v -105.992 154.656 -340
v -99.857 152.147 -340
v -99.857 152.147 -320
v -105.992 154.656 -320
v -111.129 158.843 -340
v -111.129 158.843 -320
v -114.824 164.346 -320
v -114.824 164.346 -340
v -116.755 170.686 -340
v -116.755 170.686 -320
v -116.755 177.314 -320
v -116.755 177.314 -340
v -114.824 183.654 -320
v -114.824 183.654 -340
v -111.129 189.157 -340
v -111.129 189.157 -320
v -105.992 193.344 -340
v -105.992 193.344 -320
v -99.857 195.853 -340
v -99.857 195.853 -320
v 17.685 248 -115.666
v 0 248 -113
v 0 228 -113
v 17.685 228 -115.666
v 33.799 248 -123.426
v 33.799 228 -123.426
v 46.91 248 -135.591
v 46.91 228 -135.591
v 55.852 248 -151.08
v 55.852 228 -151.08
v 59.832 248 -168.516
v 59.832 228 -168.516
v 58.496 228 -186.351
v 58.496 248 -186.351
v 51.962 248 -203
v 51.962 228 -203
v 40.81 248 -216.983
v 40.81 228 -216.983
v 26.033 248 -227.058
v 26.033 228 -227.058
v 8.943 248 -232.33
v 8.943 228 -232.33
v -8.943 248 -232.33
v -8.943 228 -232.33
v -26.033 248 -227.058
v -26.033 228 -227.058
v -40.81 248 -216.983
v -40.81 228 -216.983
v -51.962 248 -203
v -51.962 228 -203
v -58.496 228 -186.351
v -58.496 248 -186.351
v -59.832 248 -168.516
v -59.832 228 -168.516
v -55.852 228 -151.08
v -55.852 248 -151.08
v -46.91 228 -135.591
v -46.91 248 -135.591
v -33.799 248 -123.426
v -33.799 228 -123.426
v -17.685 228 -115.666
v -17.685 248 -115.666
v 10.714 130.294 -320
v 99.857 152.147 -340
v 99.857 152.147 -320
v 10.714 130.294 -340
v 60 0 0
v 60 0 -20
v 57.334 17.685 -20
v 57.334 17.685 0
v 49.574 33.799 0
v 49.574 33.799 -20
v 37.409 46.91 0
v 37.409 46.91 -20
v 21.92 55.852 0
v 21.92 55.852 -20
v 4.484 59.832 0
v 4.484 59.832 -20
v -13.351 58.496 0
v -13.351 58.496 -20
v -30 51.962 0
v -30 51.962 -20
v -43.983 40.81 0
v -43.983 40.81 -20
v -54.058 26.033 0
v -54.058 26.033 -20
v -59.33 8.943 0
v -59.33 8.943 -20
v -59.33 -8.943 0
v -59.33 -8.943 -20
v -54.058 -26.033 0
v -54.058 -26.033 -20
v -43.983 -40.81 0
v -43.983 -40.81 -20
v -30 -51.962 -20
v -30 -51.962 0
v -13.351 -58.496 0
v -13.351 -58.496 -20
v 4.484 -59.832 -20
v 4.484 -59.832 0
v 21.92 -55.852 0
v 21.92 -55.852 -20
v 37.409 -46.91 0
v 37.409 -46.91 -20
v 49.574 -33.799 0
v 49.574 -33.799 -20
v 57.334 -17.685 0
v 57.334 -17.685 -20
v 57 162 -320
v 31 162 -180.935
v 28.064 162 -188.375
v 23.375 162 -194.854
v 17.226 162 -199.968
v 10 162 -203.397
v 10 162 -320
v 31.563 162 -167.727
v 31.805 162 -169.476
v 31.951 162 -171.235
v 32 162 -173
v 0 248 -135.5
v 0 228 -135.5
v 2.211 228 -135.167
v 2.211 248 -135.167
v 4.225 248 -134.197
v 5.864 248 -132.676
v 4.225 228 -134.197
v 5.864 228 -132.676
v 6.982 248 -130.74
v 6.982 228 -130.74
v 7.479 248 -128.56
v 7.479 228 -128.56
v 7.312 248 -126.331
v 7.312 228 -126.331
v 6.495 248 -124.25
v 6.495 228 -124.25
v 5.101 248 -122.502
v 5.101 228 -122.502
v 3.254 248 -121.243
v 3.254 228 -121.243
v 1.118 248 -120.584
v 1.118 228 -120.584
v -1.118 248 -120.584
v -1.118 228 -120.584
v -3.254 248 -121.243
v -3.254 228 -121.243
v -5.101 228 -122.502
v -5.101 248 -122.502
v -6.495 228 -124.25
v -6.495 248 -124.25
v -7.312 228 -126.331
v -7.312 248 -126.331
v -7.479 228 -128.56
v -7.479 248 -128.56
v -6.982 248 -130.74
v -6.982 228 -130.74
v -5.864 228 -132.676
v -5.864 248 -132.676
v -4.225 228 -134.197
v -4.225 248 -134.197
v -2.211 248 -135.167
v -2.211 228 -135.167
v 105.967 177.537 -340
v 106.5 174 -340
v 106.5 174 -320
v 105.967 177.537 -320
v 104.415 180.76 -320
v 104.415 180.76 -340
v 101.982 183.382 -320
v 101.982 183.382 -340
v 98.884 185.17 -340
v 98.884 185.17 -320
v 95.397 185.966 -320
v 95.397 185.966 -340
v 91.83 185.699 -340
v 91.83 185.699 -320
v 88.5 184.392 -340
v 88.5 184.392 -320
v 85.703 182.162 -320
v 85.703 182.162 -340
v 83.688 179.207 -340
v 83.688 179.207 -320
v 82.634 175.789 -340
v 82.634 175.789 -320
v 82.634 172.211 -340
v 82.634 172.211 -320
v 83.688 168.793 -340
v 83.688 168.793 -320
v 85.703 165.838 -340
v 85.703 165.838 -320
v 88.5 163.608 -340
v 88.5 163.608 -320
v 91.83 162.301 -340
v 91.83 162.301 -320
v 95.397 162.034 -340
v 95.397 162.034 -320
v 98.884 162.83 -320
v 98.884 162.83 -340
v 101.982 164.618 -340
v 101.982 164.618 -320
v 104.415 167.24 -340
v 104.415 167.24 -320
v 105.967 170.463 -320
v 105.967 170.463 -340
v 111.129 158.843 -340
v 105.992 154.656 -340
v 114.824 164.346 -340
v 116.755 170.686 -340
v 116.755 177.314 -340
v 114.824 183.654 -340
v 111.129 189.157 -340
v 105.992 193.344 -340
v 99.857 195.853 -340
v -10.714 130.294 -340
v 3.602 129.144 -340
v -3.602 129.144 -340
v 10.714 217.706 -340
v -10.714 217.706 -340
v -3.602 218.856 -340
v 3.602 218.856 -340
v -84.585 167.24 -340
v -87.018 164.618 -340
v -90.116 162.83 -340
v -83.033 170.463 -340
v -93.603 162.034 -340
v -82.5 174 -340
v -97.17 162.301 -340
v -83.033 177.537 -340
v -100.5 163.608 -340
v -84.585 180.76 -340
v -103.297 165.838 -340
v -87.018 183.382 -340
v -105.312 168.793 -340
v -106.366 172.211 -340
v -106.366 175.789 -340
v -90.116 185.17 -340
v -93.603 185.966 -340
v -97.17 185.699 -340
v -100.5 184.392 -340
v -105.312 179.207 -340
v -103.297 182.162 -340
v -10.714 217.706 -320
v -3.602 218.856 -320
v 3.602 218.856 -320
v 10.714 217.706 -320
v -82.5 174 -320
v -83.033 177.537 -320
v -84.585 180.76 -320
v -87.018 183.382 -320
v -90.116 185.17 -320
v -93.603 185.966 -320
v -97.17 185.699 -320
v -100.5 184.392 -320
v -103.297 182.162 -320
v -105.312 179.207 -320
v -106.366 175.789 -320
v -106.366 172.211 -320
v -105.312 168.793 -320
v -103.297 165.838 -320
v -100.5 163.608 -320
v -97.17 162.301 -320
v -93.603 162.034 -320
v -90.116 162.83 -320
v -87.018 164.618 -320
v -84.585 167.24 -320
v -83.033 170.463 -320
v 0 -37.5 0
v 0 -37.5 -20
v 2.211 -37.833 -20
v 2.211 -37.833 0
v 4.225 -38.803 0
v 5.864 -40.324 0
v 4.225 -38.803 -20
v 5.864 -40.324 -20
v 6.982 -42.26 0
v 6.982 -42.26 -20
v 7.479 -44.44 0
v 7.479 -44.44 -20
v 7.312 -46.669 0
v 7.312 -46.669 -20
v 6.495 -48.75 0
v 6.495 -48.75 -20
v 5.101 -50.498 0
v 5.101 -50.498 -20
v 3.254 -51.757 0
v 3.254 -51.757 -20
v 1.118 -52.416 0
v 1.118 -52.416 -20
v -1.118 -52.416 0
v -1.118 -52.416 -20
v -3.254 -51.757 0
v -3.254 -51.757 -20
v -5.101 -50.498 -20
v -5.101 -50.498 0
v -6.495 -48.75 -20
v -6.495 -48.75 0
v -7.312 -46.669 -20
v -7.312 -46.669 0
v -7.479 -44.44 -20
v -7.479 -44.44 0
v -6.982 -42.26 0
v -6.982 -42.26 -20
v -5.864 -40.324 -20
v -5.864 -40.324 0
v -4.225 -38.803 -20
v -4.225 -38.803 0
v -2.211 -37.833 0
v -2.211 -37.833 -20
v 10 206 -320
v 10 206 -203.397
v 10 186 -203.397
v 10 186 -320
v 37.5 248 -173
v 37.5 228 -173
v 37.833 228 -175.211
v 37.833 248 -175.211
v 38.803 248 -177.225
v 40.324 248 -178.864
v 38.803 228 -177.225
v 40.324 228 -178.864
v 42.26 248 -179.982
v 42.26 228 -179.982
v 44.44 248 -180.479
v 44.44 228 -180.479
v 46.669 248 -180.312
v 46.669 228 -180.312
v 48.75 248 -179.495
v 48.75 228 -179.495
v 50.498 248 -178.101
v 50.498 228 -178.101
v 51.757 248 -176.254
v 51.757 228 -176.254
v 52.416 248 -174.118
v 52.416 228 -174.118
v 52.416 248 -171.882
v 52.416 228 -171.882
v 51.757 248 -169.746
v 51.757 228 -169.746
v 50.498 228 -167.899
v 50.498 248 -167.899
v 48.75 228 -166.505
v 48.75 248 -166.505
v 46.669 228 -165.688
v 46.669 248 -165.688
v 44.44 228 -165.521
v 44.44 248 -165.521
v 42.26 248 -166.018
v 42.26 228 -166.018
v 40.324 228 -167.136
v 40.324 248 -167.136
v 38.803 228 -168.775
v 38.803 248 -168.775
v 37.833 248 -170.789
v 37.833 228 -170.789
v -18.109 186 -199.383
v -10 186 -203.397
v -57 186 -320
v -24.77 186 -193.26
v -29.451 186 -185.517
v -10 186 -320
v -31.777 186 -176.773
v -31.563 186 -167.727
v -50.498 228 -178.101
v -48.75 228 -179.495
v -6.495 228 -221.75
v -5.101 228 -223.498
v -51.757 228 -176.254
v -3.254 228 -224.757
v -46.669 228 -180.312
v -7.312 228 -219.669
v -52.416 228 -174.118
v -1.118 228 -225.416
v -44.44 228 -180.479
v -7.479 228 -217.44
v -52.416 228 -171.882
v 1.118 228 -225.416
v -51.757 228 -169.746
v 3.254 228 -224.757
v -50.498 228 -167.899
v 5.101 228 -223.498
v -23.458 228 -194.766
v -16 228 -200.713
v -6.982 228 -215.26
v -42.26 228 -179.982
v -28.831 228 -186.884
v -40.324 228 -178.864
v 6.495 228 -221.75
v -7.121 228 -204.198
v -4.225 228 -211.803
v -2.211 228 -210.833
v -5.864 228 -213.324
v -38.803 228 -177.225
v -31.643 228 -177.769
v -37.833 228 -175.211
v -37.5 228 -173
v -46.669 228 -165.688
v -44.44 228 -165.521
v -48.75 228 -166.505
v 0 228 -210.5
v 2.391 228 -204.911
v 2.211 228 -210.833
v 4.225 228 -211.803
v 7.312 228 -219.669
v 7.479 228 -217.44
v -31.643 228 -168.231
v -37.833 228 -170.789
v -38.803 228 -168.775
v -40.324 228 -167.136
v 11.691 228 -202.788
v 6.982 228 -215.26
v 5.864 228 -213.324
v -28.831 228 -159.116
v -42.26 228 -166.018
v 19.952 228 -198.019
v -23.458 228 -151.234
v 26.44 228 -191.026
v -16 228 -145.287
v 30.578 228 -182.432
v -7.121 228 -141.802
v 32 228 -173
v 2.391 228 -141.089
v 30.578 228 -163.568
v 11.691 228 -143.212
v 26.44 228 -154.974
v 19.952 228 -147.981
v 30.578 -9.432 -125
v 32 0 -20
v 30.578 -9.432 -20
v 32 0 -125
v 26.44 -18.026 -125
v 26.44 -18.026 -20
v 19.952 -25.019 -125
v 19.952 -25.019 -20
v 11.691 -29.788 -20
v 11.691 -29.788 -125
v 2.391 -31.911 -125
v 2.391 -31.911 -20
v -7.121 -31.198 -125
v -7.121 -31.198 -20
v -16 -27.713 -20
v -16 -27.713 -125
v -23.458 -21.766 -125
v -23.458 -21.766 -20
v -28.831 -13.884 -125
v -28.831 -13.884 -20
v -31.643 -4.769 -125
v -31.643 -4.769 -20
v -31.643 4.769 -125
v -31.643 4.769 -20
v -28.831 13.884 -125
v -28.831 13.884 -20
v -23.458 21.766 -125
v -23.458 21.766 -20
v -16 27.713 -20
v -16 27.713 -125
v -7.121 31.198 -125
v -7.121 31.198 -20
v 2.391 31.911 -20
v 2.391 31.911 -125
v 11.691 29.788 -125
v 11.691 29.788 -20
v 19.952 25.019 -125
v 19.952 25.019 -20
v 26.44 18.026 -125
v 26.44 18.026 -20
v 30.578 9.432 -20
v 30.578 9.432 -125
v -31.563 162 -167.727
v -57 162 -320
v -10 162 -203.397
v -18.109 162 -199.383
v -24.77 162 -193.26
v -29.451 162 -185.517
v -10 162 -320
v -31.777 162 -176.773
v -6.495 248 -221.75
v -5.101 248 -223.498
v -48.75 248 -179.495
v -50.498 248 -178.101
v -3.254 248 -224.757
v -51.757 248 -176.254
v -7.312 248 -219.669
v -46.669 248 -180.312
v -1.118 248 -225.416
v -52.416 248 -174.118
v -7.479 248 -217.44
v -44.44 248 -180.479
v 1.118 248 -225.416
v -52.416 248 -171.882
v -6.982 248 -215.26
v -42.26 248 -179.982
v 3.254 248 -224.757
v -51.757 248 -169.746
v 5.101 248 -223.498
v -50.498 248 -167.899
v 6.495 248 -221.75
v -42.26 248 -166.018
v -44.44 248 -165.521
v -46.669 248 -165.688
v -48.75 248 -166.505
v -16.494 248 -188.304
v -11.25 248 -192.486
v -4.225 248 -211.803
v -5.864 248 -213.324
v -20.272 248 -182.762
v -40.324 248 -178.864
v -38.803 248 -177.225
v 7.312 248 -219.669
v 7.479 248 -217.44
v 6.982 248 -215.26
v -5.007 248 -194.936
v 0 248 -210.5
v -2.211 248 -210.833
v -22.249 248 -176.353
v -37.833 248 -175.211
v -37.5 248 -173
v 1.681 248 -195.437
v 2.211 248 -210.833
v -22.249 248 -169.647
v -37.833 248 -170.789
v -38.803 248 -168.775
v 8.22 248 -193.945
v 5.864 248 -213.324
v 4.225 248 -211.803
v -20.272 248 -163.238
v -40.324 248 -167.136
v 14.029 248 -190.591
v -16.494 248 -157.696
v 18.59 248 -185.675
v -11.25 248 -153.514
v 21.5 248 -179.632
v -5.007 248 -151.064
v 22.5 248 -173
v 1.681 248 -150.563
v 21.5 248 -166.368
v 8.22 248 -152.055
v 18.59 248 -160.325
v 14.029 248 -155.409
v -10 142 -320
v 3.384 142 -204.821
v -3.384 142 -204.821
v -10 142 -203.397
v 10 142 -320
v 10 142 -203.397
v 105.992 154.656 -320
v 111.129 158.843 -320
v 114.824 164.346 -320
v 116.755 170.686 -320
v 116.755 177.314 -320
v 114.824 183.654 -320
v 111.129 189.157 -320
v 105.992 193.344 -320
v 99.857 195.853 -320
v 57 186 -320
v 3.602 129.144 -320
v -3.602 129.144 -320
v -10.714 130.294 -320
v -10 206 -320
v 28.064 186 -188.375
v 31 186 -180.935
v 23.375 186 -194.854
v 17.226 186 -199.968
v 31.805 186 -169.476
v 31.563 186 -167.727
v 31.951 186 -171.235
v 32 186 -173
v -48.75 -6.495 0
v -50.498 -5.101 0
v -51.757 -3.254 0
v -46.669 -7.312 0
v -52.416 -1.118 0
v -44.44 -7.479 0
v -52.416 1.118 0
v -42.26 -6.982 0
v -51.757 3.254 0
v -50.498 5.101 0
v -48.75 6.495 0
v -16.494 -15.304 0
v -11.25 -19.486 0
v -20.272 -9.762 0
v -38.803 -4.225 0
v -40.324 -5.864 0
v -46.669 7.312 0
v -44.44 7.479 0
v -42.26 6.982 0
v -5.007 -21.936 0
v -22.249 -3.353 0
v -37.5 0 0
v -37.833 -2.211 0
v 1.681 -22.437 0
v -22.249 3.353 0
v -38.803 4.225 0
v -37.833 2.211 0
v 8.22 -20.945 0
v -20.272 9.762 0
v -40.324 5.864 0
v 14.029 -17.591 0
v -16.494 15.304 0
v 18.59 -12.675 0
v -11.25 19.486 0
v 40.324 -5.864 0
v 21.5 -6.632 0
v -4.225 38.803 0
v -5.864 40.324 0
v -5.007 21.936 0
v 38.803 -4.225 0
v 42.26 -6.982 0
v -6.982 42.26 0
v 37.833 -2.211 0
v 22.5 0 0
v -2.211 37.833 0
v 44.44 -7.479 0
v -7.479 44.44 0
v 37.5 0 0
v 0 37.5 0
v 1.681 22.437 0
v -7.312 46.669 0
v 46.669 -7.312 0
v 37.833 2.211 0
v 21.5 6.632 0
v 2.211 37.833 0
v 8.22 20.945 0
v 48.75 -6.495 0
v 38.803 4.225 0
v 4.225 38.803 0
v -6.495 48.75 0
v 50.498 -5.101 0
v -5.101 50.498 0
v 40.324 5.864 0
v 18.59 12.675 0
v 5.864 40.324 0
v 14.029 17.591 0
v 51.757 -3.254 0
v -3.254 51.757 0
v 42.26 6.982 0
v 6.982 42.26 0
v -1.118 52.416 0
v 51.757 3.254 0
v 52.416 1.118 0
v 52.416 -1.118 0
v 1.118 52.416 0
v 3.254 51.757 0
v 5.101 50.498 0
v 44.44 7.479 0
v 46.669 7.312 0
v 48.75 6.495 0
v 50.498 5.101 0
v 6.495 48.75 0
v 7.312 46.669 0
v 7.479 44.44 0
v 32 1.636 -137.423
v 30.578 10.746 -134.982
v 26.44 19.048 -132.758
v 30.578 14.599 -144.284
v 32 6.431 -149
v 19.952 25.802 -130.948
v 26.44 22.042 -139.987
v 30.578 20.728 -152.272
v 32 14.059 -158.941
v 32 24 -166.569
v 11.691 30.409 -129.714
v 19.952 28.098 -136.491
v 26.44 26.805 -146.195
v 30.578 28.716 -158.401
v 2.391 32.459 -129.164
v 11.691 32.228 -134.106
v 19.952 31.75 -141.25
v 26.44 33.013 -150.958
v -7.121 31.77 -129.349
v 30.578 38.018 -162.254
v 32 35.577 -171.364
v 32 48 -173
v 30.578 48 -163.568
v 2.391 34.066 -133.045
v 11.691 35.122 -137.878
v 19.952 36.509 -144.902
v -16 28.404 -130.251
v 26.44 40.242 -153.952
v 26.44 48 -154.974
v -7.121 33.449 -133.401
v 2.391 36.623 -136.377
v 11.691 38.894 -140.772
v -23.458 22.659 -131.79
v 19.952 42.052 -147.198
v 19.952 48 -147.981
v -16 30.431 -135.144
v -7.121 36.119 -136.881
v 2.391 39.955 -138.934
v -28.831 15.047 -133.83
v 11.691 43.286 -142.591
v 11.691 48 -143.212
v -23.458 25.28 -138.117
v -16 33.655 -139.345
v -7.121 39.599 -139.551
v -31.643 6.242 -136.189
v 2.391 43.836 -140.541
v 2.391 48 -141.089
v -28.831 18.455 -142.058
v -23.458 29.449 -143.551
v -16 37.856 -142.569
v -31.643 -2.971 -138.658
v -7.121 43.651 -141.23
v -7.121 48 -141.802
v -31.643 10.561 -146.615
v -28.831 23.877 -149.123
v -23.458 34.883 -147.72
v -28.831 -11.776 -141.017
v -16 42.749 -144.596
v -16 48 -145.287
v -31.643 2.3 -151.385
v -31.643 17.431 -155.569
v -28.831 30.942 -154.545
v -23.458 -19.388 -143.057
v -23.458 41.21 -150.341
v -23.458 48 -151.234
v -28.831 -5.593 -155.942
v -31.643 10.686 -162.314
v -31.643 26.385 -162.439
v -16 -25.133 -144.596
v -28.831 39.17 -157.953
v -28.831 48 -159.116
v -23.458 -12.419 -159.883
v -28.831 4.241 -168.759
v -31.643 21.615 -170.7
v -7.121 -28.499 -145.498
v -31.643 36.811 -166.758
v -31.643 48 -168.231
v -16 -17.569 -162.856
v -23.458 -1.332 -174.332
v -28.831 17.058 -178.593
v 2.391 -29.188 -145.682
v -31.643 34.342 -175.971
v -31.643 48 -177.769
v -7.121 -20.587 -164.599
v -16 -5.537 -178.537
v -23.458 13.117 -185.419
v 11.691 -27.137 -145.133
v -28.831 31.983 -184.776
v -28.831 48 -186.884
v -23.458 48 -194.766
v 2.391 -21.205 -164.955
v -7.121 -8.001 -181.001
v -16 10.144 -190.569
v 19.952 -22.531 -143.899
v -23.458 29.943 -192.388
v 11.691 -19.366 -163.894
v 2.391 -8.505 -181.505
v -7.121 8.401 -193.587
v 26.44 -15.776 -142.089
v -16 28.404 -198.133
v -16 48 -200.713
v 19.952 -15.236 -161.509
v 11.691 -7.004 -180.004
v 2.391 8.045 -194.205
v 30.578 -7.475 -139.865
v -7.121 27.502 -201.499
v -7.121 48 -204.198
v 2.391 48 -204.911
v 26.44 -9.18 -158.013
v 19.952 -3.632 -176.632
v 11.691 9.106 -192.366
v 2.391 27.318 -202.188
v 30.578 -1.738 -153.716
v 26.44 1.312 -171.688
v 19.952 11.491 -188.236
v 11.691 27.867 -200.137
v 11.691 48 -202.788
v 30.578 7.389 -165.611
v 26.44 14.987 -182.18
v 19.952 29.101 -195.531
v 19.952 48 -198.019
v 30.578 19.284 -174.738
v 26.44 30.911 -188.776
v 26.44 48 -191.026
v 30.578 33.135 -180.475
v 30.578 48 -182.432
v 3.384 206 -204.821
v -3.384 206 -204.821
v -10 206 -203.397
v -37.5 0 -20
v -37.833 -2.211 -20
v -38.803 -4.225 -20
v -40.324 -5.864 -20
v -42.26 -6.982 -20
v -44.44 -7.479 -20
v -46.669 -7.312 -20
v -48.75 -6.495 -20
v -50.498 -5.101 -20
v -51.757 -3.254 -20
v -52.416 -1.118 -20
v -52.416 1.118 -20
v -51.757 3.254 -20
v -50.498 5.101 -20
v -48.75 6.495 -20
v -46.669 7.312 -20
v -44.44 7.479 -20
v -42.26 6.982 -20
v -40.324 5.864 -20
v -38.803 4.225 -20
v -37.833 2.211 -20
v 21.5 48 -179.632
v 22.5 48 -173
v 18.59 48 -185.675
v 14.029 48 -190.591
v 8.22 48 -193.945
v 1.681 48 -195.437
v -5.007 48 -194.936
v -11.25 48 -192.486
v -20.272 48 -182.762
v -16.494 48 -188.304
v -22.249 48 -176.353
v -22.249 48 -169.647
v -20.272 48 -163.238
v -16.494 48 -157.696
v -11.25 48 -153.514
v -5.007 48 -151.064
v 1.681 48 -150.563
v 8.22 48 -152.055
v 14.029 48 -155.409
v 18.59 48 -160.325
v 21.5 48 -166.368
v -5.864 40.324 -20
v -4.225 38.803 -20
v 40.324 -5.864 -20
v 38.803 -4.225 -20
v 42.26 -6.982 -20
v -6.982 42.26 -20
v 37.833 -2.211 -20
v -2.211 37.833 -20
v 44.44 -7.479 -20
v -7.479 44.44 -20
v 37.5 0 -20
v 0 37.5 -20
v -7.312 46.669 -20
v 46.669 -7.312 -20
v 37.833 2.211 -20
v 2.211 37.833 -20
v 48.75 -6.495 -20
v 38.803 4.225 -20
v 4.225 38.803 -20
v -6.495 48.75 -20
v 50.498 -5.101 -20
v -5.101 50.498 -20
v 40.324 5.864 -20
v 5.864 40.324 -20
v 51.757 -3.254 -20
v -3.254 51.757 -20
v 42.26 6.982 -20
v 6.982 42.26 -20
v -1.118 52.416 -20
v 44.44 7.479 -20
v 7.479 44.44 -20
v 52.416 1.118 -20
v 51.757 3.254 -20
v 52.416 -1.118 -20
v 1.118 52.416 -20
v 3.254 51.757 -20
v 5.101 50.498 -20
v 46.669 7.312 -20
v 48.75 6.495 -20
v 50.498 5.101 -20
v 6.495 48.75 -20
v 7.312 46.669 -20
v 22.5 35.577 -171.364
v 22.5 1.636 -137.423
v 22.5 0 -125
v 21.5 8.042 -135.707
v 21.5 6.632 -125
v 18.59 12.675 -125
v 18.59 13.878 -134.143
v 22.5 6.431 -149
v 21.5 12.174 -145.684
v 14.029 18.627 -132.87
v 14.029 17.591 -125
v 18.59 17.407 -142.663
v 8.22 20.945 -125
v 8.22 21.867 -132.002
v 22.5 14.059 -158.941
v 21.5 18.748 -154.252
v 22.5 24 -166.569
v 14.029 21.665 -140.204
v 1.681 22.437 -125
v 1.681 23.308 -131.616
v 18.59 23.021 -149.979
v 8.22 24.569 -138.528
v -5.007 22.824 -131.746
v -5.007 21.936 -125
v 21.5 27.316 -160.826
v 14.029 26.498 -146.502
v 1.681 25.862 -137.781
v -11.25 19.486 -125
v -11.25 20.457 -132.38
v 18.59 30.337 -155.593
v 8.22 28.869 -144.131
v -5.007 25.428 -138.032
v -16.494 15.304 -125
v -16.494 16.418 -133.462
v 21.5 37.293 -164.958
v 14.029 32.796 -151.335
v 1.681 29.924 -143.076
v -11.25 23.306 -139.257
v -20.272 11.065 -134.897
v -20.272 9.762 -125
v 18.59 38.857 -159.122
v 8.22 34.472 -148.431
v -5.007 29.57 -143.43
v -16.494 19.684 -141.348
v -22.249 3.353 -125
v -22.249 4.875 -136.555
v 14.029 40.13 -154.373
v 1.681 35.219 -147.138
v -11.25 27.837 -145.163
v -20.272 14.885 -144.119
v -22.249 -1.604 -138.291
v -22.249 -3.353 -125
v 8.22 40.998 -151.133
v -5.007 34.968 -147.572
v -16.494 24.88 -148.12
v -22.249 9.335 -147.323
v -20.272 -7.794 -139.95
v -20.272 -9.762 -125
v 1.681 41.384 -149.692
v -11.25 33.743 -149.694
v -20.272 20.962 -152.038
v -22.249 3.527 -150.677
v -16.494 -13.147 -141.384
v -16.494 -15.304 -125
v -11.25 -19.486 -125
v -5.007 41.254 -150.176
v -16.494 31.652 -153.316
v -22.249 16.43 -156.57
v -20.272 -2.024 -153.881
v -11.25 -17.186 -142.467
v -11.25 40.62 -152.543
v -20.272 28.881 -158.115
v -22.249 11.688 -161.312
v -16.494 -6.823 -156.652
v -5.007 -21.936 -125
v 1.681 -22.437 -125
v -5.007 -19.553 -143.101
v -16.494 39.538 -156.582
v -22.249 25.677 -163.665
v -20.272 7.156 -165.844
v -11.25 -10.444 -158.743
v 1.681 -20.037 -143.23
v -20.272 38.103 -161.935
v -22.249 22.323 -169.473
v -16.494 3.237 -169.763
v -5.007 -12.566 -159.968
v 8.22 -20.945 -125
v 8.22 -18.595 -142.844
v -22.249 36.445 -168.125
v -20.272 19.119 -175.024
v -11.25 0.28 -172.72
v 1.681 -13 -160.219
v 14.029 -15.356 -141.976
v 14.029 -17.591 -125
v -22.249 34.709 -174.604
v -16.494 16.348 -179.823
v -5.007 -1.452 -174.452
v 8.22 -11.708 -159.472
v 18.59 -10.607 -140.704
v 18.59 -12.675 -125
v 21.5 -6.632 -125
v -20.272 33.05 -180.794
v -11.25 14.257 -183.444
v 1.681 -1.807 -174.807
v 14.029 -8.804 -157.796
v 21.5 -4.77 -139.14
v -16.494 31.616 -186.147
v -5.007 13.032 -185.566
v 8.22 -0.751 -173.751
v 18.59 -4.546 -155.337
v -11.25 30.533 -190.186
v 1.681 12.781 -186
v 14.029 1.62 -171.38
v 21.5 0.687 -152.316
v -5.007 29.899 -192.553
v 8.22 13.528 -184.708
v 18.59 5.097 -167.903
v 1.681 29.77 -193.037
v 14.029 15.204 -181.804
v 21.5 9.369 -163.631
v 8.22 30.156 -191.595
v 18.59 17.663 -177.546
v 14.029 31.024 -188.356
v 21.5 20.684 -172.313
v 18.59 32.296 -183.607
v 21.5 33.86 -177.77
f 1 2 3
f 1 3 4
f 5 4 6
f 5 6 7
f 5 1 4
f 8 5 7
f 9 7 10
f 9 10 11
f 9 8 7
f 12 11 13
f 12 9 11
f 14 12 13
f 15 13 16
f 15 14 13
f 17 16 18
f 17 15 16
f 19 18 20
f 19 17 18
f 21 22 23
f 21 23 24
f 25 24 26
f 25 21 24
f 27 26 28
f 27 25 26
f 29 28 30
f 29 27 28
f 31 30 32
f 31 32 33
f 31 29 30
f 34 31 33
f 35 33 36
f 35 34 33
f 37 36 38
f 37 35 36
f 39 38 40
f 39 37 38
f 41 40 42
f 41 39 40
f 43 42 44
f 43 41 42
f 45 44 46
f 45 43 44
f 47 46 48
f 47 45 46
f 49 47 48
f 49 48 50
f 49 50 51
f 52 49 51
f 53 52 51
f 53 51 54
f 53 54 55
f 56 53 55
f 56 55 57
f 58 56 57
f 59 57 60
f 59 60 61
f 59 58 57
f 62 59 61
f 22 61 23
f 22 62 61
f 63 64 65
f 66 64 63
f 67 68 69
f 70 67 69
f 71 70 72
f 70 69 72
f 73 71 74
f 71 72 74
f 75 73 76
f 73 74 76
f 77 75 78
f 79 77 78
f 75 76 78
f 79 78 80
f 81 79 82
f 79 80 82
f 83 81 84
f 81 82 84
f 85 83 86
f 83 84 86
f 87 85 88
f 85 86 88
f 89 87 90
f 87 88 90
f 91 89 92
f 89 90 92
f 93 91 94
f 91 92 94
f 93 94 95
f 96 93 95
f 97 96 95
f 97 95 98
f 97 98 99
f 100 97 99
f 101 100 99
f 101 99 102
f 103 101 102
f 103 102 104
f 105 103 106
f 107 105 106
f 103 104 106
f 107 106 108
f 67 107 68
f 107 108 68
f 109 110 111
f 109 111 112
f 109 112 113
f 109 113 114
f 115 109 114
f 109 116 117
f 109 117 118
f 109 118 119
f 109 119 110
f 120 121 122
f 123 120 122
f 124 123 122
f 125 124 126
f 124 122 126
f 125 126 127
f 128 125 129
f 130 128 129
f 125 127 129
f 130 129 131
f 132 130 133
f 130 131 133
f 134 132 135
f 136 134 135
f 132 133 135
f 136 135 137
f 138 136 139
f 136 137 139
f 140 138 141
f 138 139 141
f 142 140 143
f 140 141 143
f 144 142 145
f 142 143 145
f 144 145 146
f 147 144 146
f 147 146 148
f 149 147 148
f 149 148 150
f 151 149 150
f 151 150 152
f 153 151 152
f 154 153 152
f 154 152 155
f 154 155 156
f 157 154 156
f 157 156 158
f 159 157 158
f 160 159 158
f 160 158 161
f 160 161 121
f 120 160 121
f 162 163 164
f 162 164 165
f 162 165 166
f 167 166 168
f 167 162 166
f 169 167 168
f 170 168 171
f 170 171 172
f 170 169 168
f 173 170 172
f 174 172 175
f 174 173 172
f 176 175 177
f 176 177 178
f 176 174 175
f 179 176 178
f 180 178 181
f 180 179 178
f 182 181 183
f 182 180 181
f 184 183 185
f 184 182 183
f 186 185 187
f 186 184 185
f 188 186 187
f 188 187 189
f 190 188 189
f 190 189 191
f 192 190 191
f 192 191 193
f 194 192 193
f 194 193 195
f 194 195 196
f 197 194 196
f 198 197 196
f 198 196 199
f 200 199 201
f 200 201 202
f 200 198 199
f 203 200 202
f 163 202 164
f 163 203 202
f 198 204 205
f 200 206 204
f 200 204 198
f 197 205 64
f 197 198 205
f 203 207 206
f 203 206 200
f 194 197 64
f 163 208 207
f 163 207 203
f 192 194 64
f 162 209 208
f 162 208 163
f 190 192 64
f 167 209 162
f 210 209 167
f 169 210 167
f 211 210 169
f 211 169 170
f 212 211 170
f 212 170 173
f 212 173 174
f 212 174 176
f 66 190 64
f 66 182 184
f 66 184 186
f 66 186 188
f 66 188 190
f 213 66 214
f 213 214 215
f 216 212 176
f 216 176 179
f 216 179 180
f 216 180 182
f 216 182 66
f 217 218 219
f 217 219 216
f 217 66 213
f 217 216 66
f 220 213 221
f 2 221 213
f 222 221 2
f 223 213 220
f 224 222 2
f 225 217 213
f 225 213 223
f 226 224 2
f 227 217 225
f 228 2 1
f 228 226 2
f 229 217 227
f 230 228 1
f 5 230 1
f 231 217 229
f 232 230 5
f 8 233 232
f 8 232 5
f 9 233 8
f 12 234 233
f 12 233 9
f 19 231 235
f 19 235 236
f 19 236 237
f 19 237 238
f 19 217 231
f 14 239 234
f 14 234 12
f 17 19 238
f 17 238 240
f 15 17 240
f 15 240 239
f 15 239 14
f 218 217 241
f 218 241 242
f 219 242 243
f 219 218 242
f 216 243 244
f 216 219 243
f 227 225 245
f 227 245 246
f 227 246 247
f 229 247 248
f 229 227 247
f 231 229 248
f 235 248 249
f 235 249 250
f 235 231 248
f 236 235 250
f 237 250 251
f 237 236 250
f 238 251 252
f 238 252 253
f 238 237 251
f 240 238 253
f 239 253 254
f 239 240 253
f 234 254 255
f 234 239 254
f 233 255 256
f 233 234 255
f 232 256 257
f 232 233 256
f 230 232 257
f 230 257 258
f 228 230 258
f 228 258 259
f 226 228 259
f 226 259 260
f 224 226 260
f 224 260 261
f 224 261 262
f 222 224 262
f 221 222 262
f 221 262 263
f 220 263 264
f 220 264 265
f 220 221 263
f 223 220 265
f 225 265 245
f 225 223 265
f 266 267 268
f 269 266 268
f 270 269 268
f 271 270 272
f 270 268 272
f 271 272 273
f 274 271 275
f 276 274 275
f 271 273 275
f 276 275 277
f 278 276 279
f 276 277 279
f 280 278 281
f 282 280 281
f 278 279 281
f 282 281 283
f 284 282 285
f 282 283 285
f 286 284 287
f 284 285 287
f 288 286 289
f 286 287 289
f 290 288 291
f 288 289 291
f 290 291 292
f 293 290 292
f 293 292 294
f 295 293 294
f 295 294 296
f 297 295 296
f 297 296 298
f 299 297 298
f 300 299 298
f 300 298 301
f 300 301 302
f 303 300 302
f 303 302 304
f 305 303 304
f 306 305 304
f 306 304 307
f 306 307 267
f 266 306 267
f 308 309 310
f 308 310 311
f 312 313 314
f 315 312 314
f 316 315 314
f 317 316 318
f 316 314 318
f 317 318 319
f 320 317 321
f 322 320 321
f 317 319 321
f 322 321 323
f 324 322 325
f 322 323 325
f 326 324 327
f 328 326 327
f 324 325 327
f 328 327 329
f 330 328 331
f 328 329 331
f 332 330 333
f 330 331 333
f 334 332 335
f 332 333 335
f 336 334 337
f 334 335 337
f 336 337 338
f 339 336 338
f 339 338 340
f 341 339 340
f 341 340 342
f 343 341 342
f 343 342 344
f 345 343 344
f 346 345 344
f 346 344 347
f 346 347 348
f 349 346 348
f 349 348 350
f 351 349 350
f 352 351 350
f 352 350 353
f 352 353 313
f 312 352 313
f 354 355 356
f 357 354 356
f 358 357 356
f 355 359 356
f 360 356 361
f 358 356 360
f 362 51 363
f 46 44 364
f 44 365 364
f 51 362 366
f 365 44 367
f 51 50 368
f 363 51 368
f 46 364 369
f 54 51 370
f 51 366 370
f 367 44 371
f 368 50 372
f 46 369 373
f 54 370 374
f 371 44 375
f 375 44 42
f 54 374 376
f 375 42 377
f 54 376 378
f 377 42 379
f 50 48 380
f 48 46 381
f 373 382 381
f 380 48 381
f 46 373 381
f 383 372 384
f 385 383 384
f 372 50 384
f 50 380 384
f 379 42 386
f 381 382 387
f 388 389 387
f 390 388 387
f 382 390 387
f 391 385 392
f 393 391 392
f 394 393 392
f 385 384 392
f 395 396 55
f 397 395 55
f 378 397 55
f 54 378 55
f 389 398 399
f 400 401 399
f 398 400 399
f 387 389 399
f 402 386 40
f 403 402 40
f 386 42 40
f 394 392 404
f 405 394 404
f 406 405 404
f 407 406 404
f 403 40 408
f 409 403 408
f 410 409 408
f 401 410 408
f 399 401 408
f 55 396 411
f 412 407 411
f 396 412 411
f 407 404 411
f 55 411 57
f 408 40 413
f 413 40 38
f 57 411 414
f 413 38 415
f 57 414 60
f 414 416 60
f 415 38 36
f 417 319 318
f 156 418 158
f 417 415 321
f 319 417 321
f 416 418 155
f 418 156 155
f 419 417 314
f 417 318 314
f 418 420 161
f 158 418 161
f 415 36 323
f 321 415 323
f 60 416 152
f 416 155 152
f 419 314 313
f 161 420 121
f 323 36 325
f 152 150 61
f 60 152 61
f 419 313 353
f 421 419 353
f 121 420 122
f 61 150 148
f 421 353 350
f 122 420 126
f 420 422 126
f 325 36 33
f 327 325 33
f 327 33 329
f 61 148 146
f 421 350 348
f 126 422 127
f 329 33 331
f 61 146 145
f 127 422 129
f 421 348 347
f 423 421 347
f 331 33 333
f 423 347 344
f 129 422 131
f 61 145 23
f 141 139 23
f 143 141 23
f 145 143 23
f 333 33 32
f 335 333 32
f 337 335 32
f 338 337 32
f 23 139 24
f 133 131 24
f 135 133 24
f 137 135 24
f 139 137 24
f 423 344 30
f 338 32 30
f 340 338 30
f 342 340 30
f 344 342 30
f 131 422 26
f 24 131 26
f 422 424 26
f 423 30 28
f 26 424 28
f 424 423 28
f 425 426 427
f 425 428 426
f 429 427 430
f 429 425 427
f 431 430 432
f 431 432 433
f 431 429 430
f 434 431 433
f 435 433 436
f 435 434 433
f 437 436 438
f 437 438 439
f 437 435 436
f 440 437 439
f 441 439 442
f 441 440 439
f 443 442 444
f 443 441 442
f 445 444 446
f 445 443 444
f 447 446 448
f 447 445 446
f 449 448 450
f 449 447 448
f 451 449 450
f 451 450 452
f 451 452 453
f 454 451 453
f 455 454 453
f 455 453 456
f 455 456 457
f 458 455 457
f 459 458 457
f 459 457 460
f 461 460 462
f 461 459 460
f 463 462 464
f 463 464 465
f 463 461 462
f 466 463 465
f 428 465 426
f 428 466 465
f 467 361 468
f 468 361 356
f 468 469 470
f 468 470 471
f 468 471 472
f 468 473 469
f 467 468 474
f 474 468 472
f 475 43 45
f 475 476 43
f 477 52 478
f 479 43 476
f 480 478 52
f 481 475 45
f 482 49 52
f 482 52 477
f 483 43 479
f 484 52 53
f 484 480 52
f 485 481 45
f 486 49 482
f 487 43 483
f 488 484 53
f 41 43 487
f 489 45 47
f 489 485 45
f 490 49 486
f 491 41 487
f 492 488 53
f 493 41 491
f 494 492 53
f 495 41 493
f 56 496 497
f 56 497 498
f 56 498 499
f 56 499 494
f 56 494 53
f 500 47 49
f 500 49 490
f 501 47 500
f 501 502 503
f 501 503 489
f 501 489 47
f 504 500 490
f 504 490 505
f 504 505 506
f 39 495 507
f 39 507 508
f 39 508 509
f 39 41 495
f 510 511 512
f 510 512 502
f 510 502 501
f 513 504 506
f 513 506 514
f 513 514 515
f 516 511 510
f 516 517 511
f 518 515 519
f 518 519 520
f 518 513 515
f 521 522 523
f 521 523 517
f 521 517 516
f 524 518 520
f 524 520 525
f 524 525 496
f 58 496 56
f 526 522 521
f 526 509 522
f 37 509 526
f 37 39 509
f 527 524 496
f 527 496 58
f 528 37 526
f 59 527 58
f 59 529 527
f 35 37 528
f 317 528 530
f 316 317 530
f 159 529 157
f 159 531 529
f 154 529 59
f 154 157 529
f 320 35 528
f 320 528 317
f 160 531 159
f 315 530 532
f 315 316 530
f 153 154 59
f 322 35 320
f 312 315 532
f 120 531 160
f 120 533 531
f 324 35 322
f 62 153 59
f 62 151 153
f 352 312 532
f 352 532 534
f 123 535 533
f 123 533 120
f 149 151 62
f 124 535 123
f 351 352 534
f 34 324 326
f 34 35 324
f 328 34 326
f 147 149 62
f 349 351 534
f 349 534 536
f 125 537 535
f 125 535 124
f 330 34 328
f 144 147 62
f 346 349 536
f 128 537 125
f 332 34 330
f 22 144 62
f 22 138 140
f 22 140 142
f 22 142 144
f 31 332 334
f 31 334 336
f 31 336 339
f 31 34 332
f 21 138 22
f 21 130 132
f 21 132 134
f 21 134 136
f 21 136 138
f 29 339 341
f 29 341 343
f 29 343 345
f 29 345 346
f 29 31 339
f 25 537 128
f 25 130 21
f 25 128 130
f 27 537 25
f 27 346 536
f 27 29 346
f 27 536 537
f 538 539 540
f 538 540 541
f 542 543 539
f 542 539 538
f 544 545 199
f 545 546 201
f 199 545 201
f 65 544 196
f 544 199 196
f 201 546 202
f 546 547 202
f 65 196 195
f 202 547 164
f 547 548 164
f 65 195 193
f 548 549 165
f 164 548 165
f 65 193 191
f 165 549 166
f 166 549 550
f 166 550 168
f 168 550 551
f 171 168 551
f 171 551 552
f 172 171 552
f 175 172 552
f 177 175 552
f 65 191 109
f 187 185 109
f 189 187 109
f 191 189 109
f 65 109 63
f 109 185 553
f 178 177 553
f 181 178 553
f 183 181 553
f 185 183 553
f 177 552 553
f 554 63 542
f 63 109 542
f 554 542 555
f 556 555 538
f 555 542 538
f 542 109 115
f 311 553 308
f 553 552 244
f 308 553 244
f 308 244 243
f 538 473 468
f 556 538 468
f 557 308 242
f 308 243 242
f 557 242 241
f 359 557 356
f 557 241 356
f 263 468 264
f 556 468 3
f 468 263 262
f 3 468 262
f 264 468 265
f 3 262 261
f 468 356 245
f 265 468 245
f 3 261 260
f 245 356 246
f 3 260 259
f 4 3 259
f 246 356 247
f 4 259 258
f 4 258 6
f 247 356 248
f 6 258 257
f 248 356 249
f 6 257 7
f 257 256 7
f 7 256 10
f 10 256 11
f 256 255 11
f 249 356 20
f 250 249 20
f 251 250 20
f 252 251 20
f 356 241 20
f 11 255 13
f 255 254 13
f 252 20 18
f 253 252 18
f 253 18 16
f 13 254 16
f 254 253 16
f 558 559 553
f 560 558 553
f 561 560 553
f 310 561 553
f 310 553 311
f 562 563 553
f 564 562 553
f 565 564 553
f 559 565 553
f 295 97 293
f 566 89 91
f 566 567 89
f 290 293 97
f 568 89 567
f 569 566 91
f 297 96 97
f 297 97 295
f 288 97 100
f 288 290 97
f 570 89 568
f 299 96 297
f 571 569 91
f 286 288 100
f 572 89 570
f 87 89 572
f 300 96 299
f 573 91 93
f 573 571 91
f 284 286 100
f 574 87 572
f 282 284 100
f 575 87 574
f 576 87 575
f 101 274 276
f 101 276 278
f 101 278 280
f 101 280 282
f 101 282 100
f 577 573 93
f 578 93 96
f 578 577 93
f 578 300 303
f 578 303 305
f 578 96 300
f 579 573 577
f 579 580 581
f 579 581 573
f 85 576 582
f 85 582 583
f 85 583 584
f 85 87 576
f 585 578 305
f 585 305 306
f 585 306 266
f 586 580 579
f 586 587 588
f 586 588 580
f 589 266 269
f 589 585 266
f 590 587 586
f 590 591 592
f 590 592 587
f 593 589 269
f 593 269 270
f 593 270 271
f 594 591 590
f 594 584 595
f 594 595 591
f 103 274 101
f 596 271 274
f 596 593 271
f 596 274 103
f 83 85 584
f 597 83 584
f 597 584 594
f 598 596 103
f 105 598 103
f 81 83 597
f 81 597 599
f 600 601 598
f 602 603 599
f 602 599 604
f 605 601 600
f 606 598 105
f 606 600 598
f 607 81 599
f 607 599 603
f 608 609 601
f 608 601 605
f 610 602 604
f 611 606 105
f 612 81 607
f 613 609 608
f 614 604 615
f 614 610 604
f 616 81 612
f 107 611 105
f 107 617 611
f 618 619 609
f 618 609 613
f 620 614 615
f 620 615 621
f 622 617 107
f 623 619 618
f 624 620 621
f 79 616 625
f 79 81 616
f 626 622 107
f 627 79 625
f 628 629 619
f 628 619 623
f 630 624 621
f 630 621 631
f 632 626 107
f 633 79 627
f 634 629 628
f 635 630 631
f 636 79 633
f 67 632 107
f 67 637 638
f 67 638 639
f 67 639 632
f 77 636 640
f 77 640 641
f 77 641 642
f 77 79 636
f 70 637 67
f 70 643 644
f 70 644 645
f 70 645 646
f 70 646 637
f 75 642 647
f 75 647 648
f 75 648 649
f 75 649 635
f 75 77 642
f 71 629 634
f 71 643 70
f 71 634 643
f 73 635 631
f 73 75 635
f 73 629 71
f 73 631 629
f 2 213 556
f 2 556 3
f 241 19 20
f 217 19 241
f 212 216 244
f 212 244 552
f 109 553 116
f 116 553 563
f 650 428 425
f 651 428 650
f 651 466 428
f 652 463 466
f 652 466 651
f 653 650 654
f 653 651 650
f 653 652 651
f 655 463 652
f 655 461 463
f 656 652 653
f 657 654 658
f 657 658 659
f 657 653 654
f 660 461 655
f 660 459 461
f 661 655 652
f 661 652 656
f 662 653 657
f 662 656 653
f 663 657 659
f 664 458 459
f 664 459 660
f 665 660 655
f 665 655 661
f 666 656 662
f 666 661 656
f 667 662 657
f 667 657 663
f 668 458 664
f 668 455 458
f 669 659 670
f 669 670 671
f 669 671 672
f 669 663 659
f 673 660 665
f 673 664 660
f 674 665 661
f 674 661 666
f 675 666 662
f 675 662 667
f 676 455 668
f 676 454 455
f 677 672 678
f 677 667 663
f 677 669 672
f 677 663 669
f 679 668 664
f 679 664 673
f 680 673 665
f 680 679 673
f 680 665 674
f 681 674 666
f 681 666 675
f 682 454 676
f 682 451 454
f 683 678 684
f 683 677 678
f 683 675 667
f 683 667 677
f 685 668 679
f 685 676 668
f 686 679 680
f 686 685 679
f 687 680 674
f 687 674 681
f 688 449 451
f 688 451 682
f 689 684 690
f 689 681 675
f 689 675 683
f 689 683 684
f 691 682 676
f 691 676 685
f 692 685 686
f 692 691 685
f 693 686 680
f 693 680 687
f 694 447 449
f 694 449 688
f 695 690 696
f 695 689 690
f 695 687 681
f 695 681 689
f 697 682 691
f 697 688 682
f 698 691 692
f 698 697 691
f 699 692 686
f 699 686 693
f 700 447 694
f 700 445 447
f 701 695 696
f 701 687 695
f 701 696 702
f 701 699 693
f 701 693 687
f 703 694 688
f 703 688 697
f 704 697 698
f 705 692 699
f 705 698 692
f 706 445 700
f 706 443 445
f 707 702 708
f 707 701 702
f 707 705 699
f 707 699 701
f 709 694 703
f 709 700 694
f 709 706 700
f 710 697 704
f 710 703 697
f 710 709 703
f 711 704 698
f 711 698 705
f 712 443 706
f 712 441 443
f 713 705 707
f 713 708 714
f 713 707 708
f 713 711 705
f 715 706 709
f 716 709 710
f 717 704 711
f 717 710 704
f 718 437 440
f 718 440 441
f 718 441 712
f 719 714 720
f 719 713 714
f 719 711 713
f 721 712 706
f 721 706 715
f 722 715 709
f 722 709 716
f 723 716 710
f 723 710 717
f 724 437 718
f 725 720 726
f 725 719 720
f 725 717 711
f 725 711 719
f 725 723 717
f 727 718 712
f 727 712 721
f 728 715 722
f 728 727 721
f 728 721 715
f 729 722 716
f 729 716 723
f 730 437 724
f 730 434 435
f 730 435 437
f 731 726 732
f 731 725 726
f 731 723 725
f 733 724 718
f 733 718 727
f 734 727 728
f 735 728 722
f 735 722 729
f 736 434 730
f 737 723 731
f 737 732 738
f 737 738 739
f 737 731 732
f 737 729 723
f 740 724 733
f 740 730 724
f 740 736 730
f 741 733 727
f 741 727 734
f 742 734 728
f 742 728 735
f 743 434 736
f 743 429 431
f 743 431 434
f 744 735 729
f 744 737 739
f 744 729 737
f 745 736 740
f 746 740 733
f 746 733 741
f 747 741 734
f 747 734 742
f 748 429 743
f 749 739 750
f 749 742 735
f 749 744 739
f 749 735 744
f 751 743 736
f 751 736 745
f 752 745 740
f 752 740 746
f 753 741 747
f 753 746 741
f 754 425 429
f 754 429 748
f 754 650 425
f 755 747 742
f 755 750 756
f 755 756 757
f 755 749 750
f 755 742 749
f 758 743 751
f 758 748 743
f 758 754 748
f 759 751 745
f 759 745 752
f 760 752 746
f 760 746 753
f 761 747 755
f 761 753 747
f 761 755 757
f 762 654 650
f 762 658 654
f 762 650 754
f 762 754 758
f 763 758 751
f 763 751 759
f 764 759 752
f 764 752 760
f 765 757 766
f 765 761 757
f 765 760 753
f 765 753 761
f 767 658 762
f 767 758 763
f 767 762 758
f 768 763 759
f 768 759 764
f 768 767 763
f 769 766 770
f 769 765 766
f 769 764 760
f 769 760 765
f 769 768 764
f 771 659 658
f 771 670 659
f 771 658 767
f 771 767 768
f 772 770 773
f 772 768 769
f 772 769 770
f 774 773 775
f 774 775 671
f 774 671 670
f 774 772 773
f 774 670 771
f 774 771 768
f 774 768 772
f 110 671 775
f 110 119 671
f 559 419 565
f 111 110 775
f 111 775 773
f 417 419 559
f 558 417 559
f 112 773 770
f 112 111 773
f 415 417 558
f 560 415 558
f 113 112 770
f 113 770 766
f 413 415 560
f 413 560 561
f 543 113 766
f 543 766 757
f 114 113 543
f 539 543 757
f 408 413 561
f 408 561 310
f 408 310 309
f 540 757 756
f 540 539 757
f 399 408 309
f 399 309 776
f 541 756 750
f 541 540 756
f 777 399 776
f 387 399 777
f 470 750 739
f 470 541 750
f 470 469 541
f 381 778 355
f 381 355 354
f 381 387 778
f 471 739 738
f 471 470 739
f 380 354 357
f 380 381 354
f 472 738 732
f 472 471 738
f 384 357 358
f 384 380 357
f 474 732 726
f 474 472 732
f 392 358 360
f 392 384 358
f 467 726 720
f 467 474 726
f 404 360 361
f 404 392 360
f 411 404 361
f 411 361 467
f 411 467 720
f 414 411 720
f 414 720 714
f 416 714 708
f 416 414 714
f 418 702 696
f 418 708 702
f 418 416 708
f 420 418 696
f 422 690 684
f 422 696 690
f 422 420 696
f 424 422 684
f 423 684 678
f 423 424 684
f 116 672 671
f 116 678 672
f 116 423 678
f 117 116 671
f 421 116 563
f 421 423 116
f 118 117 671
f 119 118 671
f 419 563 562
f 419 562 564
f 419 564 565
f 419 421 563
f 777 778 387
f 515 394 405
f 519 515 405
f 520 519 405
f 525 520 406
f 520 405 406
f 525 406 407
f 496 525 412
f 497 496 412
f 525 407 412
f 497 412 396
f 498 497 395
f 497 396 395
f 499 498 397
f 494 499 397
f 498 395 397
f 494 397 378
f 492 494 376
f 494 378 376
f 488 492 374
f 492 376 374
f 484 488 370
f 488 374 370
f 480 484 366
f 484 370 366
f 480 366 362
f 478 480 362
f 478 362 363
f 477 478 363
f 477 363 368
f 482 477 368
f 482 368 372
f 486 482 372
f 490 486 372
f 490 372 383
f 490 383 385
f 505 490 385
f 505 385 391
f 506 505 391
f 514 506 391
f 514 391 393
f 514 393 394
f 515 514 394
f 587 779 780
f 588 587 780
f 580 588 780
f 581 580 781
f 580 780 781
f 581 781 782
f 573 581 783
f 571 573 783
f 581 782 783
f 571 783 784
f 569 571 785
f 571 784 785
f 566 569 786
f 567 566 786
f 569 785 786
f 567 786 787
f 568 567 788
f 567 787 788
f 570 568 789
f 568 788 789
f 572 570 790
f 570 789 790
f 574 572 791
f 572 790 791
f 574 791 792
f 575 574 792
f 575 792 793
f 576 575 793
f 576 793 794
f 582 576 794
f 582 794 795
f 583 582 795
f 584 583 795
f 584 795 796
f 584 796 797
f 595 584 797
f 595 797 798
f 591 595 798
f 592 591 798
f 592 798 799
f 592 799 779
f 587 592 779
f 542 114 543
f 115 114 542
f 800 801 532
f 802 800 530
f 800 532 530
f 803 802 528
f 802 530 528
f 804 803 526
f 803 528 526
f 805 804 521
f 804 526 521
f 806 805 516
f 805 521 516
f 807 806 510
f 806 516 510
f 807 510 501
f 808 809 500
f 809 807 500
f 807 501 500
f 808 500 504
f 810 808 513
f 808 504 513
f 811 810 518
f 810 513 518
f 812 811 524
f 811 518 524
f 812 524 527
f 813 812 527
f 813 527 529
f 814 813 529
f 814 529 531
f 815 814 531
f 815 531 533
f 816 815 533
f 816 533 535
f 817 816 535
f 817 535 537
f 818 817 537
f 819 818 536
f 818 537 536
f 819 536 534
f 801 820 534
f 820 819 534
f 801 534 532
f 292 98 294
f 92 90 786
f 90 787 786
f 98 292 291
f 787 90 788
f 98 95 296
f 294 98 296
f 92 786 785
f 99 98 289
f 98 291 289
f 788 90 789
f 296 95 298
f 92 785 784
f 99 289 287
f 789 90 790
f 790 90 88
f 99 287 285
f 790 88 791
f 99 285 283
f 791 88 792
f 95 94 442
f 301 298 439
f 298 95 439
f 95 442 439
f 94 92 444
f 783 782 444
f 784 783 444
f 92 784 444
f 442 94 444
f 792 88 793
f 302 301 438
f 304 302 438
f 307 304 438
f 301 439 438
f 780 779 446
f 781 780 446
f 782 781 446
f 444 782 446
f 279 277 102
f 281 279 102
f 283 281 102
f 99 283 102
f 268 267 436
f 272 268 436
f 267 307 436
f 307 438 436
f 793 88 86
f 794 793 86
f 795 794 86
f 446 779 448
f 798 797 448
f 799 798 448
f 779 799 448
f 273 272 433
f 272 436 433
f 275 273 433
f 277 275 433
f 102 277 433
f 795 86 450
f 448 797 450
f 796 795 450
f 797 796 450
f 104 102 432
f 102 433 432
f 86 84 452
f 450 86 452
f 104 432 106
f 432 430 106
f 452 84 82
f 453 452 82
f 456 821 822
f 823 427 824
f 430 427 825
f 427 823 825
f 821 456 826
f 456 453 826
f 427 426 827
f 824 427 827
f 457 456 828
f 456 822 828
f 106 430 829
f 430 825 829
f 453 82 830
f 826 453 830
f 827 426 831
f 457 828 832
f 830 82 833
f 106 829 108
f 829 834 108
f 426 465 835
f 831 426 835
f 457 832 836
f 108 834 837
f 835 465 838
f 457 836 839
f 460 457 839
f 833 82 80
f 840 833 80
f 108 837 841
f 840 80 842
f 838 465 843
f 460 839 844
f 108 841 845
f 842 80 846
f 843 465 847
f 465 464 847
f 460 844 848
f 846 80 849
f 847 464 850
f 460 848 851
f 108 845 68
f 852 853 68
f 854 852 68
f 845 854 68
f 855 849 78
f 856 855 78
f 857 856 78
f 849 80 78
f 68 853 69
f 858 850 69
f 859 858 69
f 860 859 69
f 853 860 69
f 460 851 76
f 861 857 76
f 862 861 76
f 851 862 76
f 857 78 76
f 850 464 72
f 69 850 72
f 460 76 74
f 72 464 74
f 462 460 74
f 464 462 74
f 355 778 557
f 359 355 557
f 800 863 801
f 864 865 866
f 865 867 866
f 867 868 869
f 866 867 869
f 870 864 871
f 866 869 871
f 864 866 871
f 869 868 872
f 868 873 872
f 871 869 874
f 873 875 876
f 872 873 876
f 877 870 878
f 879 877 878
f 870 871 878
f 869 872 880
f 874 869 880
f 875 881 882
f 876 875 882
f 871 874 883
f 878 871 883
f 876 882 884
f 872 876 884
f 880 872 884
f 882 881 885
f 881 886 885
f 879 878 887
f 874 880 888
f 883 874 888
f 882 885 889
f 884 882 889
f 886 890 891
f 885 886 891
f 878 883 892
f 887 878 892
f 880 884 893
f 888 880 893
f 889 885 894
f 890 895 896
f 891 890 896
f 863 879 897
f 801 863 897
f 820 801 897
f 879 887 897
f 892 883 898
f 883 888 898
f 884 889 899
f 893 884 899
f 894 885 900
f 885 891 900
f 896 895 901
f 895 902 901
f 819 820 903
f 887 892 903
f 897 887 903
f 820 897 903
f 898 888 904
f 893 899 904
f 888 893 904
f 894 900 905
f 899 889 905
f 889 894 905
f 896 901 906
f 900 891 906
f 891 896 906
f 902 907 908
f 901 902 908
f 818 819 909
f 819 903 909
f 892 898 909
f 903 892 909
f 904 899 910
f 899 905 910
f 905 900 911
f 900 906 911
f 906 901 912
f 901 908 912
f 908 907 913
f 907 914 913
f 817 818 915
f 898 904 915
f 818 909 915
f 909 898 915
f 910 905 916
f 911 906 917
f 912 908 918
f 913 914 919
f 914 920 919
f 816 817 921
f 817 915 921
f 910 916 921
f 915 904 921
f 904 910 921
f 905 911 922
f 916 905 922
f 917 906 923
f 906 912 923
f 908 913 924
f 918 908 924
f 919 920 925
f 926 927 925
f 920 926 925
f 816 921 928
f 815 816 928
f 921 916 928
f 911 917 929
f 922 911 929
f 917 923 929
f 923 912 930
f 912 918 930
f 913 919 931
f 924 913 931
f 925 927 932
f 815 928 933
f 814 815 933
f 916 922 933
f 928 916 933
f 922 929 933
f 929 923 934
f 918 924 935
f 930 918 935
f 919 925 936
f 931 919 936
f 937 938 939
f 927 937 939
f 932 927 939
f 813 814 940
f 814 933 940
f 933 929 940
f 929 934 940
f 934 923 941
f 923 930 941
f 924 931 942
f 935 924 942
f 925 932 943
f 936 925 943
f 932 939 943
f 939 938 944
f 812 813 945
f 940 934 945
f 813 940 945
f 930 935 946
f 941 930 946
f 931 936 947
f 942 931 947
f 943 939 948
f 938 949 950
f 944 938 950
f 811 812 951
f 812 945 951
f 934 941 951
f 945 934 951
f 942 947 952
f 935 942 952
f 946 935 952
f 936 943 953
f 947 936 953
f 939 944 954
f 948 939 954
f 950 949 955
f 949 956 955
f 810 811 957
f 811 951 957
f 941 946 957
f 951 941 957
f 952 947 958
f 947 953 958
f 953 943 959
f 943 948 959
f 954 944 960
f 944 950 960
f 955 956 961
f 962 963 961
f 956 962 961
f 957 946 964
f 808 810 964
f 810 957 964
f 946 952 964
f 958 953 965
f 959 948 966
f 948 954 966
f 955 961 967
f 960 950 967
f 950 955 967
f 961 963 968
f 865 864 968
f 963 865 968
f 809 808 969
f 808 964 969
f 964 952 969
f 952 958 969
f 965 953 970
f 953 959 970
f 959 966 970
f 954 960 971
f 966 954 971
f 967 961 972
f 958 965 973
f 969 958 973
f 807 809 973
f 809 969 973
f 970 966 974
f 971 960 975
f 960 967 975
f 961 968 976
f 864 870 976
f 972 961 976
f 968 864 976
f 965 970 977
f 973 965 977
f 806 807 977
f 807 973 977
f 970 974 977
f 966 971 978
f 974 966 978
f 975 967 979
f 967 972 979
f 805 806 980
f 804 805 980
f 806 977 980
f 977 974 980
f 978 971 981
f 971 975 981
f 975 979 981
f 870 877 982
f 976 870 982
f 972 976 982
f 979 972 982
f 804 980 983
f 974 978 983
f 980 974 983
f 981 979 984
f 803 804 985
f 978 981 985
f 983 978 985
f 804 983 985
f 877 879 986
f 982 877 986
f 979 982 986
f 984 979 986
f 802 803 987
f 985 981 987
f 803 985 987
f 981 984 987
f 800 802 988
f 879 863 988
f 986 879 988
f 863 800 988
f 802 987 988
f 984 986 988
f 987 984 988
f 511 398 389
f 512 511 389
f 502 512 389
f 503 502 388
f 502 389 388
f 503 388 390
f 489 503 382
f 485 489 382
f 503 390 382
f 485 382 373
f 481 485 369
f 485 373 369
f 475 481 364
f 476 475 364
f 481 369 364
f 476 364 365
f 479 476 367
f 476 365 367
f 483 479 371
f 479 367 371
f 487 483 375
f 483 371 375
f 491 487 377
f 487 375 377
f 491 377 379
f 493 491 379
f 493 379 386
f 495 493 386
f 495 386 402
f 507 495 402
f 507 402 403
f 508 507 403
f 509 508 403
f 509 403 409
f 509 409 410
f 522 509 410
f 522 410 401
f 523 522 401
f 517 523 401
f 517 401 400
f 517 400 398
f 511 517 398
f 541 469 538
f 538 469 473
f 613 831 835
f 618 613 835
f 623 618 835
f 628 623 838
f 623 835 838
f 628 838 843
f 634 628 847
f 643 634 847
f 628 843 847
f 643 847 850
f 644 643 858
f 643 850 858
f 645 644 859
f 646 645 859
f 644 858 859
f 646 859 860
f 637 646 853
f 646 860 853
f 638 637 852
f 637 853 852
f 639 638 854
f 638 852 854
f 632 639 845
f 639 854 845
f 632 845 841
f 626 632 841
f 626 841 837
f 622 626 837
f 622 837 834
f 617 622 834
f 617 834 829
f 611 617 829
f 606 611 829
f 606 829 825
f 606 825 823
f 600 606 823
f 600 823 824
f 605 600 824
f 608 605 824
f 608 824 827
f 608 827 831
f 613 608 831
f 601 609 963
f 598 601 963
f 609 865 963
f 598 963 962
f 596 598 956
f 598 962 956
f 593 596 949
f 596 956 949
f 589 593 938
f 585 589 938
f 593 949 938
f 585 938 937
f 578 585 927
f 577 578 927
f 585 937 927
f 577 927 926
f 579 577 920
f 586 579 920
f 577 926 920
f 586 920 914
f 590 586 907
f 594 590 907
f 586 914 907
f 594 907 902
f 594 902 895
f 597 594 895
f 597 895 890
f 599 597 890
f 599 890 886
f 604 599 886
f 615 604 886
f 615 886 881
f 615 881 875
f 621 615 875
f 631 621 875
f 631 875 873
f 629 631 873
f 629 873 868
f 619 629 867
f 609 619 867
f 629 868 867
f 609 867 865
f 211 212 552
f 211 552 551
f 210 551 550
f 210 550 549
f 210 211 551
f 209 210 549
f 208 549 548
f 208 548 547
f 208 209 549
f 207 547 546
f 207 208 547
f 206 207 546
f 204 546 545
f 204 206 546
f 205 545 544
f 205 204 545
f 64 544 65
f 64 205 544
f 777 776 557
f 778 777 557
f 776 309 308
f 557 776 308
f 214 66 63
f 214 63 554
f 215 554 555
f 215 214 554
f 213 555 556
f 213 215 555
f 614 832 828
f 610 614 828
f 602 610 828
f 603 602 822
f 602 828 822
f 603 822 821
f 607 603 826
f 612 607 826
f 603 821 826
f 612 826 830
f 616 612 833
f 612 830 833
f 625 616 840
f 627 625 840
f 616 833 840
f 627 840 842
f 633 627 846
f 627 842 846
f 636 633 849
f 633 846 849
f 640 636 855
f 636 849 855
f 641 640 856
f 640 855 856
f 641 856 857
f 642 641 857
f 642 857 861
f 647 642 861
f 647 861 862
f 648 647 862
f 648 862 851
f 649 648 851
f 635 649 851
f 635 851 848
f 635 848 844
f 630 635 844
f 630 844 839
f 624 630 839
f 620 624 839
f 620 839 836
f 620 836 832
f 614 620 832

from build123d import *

# Parameters (mm, degrees)
SKETCH1_R           = 32
SKETCH1_R_2         = 22.5
SKETCH4_R           = 60
SKETCH4_R_2         = 22.5
BOSS_EXTRUDE1_DEPTH = 20
BOSS_EXTRUDE2_START = -20
SKETCH5_R           = 60
SKETCH5_R_2         = 22.5
BOSS_EXTRUDE2_DEPTH = 20
HOLE1_D             = 15
HOLE1_DEPTH         = 20
CIRPATTERN1_COUNT   = 4
HOLE2_D             = 15
HOLE2_DEPTH         = 20
CIRPATTERN2_COUNT   = 4
SKETCH10_R          = 12
BOSS_EXTRUDE3_DEPTH = 20
BOSS_EXTRUDE4_DEPTH = 12
SKETCH13_W          = 130
SKETCH13_H          = 64
BOSS_EXTRUDE6_DEPTH = 10


with BuildPart() as part:
    # Sweep1: sweep along a path in Sketch3
    with BuildLine(Plane(origin=(0, 0, 0), x_dir=(0, 0, -1), z_dir=(1, 0, 0))) as sweep1_path:
        Line((0, 0), (125, 0))
        ThreePointArc((125, 0), (158.941125497, 14.058874503), (173, 48))
        Line((173, 48), (173, 248))
    # Sketch1 → Sweep1 (sweep)
    with BuildSketch(Plane.XY):
        Circle(SKETCH1_R)
        Circle(SKETCH1_R_2, mode=Mode.SUBTRACT)
    sweep(path=sweep1_path.line)

    # Sketch4 → Boss-Extrude1 (add)
    with BuildSketch(Plane(origin=(0, 248, 0), x_dir=(1, 0, 0), z_dir=(0, 1, 0))):
        with Locations(Location((0, 173, 0), (0, 0, 270))):
            Circle(SKETCH4_R)
        with Locations((0, 173)):
            Circle(SKETCH4_R_2, mode=Mode.SUBTRACT)
    extrude(amount=-BOSS_EXTRUDE1_DEPTH)

    # Sketch5 → Boss-Extrude2 (add)
    with BuildSketch(Plane.XY.offset(BOSS_EXTRUDE2_START)):
        Circle(SKETCH5_R)
        with Locations(Location((0, 0, 0), (0, 0, 270))):
            Circle(SKETCH5_R_2, mode=Mode.SUBTRACT)
    extrude(amount=BOSS_EXTRUDE2_DEPTH)

    # Hole1
    with Locations(Plane.XY):
        with Locations((45, 0)):
            hole1 = Hole(HOLE1_D / 2, depth=HOLE1_DEPTH)

    # CirPattern1: Hole1 ×4 about axis
    cirpattern1_axis = Axis((0, 0, 0), (0, 0, 1))
    for i in range(1, CIRPATTERN1_COUNT):
        add(hole1.rotate(cirpattern1_axis, i * 360 / CIRPATTERN1_COUNT), mode=Mode.SUBTRACT)

    # Hole2
    with Locations(Plane(origin=(0, 248, 0), x_dir=(1, 0, 0), z_dir=(0, 1, 0))):
        with Locations((45, 173)):
            hole2 = Hole(HOLE2_D / 2, depth=HOLE2_DEPTH)

    # CirPattern2: Hole2 ×4 about axis
    cirpattern2_axis = Axis((0, 0, -173), (0, 1, 0))
    for i in range(1, CIRPATTERN2_COUNT):
        add(hole2.rotate(cirpattern2_axis, i * 360 / CIRPATTERN2_COUNT), mode=Mode.SUBTRACT)



with BuildPart() as body_2:
    # Sketch10 → Boss-Extrude3 (new body)
    with BuildSketch(Plane.XY.offset(-340)):
        with BuildLine():
            Line((-99.857142857, 195.852940773), (-10.714285714, 217.705881545))
            ThreePointArc((-10.714285714, 217.705881545), (0, 219), (10.714285714, 217.705881545))
            Line((10.714285714, 217.705881545), (99.857142857, 195.852940773))
            ThreePointArc((99.857142857, 195.852940773), (117, 174), (99.857142857, 152.147059227))
            Line((99.857142857, 152.147059227), (10.714285714, 130.294118455))
            ThreePointArc((10.714285714, 130.294118455), (0, 129), (-10.714285714, 130.294118455))
            Line((-10.714285714, 130.294118455), (-99.857142857, 152.147059227))
            ThreePointArc((-99.857142857, 152.147059227), (-117, 174), (-99.857142857, 195.852940773))
        make_face()
        with Locations((-94.5, 174)):
            Circle(SKETCH10_R, mode=Mode.SUBTRACT)
        with Locations((94.5, 174)):
            Circle(SKETCH10_R, mode=Mode.SUBTRACT)
    extrude(amount=BOSS_EXTRUDE3_DEPTH)


with BuildPart() as part_1:
    add(part.part)

    add(body_2.part)  # Boss-Extrude4 merges body 2
    # Sketch12 → Boss-Extrude4 (add, symmetric)
    with BuildSketch(Plane(origin=(0, 174, 0), x_dir=(1, 0, 0), z_dir=(0, 1, 0))):
        with BuildLine():
            Line((-31.562633586, 167.727414188), (-57, 320))
            Line((-57, 320), (57, 320))
            Line((57, 320), (31.562633586, 167.727414188))
            ThreePointArc((31.562633586, 167.727414188), (0, 205), (-31.562633586, 167.727414188))
        make_face()
    extrude(amount=BOSS_EXTRUDE4_DEPTH, both=True)

    # Sketch13 → Boss-Extrude6 (add, symmetric)
    with BuildSketch(Plane(origin=(0, 0, 0), x_dir=(0, 0, -1), z_dir=(1, 0, 0))):
        with Locations((261, 174)):
            Rectangle(SKETCH13_W, SKETCH13_H)
    extrude(amount=BOSS_EXTRUDE6_DEPTH, both=True)


solid = part_1.part
